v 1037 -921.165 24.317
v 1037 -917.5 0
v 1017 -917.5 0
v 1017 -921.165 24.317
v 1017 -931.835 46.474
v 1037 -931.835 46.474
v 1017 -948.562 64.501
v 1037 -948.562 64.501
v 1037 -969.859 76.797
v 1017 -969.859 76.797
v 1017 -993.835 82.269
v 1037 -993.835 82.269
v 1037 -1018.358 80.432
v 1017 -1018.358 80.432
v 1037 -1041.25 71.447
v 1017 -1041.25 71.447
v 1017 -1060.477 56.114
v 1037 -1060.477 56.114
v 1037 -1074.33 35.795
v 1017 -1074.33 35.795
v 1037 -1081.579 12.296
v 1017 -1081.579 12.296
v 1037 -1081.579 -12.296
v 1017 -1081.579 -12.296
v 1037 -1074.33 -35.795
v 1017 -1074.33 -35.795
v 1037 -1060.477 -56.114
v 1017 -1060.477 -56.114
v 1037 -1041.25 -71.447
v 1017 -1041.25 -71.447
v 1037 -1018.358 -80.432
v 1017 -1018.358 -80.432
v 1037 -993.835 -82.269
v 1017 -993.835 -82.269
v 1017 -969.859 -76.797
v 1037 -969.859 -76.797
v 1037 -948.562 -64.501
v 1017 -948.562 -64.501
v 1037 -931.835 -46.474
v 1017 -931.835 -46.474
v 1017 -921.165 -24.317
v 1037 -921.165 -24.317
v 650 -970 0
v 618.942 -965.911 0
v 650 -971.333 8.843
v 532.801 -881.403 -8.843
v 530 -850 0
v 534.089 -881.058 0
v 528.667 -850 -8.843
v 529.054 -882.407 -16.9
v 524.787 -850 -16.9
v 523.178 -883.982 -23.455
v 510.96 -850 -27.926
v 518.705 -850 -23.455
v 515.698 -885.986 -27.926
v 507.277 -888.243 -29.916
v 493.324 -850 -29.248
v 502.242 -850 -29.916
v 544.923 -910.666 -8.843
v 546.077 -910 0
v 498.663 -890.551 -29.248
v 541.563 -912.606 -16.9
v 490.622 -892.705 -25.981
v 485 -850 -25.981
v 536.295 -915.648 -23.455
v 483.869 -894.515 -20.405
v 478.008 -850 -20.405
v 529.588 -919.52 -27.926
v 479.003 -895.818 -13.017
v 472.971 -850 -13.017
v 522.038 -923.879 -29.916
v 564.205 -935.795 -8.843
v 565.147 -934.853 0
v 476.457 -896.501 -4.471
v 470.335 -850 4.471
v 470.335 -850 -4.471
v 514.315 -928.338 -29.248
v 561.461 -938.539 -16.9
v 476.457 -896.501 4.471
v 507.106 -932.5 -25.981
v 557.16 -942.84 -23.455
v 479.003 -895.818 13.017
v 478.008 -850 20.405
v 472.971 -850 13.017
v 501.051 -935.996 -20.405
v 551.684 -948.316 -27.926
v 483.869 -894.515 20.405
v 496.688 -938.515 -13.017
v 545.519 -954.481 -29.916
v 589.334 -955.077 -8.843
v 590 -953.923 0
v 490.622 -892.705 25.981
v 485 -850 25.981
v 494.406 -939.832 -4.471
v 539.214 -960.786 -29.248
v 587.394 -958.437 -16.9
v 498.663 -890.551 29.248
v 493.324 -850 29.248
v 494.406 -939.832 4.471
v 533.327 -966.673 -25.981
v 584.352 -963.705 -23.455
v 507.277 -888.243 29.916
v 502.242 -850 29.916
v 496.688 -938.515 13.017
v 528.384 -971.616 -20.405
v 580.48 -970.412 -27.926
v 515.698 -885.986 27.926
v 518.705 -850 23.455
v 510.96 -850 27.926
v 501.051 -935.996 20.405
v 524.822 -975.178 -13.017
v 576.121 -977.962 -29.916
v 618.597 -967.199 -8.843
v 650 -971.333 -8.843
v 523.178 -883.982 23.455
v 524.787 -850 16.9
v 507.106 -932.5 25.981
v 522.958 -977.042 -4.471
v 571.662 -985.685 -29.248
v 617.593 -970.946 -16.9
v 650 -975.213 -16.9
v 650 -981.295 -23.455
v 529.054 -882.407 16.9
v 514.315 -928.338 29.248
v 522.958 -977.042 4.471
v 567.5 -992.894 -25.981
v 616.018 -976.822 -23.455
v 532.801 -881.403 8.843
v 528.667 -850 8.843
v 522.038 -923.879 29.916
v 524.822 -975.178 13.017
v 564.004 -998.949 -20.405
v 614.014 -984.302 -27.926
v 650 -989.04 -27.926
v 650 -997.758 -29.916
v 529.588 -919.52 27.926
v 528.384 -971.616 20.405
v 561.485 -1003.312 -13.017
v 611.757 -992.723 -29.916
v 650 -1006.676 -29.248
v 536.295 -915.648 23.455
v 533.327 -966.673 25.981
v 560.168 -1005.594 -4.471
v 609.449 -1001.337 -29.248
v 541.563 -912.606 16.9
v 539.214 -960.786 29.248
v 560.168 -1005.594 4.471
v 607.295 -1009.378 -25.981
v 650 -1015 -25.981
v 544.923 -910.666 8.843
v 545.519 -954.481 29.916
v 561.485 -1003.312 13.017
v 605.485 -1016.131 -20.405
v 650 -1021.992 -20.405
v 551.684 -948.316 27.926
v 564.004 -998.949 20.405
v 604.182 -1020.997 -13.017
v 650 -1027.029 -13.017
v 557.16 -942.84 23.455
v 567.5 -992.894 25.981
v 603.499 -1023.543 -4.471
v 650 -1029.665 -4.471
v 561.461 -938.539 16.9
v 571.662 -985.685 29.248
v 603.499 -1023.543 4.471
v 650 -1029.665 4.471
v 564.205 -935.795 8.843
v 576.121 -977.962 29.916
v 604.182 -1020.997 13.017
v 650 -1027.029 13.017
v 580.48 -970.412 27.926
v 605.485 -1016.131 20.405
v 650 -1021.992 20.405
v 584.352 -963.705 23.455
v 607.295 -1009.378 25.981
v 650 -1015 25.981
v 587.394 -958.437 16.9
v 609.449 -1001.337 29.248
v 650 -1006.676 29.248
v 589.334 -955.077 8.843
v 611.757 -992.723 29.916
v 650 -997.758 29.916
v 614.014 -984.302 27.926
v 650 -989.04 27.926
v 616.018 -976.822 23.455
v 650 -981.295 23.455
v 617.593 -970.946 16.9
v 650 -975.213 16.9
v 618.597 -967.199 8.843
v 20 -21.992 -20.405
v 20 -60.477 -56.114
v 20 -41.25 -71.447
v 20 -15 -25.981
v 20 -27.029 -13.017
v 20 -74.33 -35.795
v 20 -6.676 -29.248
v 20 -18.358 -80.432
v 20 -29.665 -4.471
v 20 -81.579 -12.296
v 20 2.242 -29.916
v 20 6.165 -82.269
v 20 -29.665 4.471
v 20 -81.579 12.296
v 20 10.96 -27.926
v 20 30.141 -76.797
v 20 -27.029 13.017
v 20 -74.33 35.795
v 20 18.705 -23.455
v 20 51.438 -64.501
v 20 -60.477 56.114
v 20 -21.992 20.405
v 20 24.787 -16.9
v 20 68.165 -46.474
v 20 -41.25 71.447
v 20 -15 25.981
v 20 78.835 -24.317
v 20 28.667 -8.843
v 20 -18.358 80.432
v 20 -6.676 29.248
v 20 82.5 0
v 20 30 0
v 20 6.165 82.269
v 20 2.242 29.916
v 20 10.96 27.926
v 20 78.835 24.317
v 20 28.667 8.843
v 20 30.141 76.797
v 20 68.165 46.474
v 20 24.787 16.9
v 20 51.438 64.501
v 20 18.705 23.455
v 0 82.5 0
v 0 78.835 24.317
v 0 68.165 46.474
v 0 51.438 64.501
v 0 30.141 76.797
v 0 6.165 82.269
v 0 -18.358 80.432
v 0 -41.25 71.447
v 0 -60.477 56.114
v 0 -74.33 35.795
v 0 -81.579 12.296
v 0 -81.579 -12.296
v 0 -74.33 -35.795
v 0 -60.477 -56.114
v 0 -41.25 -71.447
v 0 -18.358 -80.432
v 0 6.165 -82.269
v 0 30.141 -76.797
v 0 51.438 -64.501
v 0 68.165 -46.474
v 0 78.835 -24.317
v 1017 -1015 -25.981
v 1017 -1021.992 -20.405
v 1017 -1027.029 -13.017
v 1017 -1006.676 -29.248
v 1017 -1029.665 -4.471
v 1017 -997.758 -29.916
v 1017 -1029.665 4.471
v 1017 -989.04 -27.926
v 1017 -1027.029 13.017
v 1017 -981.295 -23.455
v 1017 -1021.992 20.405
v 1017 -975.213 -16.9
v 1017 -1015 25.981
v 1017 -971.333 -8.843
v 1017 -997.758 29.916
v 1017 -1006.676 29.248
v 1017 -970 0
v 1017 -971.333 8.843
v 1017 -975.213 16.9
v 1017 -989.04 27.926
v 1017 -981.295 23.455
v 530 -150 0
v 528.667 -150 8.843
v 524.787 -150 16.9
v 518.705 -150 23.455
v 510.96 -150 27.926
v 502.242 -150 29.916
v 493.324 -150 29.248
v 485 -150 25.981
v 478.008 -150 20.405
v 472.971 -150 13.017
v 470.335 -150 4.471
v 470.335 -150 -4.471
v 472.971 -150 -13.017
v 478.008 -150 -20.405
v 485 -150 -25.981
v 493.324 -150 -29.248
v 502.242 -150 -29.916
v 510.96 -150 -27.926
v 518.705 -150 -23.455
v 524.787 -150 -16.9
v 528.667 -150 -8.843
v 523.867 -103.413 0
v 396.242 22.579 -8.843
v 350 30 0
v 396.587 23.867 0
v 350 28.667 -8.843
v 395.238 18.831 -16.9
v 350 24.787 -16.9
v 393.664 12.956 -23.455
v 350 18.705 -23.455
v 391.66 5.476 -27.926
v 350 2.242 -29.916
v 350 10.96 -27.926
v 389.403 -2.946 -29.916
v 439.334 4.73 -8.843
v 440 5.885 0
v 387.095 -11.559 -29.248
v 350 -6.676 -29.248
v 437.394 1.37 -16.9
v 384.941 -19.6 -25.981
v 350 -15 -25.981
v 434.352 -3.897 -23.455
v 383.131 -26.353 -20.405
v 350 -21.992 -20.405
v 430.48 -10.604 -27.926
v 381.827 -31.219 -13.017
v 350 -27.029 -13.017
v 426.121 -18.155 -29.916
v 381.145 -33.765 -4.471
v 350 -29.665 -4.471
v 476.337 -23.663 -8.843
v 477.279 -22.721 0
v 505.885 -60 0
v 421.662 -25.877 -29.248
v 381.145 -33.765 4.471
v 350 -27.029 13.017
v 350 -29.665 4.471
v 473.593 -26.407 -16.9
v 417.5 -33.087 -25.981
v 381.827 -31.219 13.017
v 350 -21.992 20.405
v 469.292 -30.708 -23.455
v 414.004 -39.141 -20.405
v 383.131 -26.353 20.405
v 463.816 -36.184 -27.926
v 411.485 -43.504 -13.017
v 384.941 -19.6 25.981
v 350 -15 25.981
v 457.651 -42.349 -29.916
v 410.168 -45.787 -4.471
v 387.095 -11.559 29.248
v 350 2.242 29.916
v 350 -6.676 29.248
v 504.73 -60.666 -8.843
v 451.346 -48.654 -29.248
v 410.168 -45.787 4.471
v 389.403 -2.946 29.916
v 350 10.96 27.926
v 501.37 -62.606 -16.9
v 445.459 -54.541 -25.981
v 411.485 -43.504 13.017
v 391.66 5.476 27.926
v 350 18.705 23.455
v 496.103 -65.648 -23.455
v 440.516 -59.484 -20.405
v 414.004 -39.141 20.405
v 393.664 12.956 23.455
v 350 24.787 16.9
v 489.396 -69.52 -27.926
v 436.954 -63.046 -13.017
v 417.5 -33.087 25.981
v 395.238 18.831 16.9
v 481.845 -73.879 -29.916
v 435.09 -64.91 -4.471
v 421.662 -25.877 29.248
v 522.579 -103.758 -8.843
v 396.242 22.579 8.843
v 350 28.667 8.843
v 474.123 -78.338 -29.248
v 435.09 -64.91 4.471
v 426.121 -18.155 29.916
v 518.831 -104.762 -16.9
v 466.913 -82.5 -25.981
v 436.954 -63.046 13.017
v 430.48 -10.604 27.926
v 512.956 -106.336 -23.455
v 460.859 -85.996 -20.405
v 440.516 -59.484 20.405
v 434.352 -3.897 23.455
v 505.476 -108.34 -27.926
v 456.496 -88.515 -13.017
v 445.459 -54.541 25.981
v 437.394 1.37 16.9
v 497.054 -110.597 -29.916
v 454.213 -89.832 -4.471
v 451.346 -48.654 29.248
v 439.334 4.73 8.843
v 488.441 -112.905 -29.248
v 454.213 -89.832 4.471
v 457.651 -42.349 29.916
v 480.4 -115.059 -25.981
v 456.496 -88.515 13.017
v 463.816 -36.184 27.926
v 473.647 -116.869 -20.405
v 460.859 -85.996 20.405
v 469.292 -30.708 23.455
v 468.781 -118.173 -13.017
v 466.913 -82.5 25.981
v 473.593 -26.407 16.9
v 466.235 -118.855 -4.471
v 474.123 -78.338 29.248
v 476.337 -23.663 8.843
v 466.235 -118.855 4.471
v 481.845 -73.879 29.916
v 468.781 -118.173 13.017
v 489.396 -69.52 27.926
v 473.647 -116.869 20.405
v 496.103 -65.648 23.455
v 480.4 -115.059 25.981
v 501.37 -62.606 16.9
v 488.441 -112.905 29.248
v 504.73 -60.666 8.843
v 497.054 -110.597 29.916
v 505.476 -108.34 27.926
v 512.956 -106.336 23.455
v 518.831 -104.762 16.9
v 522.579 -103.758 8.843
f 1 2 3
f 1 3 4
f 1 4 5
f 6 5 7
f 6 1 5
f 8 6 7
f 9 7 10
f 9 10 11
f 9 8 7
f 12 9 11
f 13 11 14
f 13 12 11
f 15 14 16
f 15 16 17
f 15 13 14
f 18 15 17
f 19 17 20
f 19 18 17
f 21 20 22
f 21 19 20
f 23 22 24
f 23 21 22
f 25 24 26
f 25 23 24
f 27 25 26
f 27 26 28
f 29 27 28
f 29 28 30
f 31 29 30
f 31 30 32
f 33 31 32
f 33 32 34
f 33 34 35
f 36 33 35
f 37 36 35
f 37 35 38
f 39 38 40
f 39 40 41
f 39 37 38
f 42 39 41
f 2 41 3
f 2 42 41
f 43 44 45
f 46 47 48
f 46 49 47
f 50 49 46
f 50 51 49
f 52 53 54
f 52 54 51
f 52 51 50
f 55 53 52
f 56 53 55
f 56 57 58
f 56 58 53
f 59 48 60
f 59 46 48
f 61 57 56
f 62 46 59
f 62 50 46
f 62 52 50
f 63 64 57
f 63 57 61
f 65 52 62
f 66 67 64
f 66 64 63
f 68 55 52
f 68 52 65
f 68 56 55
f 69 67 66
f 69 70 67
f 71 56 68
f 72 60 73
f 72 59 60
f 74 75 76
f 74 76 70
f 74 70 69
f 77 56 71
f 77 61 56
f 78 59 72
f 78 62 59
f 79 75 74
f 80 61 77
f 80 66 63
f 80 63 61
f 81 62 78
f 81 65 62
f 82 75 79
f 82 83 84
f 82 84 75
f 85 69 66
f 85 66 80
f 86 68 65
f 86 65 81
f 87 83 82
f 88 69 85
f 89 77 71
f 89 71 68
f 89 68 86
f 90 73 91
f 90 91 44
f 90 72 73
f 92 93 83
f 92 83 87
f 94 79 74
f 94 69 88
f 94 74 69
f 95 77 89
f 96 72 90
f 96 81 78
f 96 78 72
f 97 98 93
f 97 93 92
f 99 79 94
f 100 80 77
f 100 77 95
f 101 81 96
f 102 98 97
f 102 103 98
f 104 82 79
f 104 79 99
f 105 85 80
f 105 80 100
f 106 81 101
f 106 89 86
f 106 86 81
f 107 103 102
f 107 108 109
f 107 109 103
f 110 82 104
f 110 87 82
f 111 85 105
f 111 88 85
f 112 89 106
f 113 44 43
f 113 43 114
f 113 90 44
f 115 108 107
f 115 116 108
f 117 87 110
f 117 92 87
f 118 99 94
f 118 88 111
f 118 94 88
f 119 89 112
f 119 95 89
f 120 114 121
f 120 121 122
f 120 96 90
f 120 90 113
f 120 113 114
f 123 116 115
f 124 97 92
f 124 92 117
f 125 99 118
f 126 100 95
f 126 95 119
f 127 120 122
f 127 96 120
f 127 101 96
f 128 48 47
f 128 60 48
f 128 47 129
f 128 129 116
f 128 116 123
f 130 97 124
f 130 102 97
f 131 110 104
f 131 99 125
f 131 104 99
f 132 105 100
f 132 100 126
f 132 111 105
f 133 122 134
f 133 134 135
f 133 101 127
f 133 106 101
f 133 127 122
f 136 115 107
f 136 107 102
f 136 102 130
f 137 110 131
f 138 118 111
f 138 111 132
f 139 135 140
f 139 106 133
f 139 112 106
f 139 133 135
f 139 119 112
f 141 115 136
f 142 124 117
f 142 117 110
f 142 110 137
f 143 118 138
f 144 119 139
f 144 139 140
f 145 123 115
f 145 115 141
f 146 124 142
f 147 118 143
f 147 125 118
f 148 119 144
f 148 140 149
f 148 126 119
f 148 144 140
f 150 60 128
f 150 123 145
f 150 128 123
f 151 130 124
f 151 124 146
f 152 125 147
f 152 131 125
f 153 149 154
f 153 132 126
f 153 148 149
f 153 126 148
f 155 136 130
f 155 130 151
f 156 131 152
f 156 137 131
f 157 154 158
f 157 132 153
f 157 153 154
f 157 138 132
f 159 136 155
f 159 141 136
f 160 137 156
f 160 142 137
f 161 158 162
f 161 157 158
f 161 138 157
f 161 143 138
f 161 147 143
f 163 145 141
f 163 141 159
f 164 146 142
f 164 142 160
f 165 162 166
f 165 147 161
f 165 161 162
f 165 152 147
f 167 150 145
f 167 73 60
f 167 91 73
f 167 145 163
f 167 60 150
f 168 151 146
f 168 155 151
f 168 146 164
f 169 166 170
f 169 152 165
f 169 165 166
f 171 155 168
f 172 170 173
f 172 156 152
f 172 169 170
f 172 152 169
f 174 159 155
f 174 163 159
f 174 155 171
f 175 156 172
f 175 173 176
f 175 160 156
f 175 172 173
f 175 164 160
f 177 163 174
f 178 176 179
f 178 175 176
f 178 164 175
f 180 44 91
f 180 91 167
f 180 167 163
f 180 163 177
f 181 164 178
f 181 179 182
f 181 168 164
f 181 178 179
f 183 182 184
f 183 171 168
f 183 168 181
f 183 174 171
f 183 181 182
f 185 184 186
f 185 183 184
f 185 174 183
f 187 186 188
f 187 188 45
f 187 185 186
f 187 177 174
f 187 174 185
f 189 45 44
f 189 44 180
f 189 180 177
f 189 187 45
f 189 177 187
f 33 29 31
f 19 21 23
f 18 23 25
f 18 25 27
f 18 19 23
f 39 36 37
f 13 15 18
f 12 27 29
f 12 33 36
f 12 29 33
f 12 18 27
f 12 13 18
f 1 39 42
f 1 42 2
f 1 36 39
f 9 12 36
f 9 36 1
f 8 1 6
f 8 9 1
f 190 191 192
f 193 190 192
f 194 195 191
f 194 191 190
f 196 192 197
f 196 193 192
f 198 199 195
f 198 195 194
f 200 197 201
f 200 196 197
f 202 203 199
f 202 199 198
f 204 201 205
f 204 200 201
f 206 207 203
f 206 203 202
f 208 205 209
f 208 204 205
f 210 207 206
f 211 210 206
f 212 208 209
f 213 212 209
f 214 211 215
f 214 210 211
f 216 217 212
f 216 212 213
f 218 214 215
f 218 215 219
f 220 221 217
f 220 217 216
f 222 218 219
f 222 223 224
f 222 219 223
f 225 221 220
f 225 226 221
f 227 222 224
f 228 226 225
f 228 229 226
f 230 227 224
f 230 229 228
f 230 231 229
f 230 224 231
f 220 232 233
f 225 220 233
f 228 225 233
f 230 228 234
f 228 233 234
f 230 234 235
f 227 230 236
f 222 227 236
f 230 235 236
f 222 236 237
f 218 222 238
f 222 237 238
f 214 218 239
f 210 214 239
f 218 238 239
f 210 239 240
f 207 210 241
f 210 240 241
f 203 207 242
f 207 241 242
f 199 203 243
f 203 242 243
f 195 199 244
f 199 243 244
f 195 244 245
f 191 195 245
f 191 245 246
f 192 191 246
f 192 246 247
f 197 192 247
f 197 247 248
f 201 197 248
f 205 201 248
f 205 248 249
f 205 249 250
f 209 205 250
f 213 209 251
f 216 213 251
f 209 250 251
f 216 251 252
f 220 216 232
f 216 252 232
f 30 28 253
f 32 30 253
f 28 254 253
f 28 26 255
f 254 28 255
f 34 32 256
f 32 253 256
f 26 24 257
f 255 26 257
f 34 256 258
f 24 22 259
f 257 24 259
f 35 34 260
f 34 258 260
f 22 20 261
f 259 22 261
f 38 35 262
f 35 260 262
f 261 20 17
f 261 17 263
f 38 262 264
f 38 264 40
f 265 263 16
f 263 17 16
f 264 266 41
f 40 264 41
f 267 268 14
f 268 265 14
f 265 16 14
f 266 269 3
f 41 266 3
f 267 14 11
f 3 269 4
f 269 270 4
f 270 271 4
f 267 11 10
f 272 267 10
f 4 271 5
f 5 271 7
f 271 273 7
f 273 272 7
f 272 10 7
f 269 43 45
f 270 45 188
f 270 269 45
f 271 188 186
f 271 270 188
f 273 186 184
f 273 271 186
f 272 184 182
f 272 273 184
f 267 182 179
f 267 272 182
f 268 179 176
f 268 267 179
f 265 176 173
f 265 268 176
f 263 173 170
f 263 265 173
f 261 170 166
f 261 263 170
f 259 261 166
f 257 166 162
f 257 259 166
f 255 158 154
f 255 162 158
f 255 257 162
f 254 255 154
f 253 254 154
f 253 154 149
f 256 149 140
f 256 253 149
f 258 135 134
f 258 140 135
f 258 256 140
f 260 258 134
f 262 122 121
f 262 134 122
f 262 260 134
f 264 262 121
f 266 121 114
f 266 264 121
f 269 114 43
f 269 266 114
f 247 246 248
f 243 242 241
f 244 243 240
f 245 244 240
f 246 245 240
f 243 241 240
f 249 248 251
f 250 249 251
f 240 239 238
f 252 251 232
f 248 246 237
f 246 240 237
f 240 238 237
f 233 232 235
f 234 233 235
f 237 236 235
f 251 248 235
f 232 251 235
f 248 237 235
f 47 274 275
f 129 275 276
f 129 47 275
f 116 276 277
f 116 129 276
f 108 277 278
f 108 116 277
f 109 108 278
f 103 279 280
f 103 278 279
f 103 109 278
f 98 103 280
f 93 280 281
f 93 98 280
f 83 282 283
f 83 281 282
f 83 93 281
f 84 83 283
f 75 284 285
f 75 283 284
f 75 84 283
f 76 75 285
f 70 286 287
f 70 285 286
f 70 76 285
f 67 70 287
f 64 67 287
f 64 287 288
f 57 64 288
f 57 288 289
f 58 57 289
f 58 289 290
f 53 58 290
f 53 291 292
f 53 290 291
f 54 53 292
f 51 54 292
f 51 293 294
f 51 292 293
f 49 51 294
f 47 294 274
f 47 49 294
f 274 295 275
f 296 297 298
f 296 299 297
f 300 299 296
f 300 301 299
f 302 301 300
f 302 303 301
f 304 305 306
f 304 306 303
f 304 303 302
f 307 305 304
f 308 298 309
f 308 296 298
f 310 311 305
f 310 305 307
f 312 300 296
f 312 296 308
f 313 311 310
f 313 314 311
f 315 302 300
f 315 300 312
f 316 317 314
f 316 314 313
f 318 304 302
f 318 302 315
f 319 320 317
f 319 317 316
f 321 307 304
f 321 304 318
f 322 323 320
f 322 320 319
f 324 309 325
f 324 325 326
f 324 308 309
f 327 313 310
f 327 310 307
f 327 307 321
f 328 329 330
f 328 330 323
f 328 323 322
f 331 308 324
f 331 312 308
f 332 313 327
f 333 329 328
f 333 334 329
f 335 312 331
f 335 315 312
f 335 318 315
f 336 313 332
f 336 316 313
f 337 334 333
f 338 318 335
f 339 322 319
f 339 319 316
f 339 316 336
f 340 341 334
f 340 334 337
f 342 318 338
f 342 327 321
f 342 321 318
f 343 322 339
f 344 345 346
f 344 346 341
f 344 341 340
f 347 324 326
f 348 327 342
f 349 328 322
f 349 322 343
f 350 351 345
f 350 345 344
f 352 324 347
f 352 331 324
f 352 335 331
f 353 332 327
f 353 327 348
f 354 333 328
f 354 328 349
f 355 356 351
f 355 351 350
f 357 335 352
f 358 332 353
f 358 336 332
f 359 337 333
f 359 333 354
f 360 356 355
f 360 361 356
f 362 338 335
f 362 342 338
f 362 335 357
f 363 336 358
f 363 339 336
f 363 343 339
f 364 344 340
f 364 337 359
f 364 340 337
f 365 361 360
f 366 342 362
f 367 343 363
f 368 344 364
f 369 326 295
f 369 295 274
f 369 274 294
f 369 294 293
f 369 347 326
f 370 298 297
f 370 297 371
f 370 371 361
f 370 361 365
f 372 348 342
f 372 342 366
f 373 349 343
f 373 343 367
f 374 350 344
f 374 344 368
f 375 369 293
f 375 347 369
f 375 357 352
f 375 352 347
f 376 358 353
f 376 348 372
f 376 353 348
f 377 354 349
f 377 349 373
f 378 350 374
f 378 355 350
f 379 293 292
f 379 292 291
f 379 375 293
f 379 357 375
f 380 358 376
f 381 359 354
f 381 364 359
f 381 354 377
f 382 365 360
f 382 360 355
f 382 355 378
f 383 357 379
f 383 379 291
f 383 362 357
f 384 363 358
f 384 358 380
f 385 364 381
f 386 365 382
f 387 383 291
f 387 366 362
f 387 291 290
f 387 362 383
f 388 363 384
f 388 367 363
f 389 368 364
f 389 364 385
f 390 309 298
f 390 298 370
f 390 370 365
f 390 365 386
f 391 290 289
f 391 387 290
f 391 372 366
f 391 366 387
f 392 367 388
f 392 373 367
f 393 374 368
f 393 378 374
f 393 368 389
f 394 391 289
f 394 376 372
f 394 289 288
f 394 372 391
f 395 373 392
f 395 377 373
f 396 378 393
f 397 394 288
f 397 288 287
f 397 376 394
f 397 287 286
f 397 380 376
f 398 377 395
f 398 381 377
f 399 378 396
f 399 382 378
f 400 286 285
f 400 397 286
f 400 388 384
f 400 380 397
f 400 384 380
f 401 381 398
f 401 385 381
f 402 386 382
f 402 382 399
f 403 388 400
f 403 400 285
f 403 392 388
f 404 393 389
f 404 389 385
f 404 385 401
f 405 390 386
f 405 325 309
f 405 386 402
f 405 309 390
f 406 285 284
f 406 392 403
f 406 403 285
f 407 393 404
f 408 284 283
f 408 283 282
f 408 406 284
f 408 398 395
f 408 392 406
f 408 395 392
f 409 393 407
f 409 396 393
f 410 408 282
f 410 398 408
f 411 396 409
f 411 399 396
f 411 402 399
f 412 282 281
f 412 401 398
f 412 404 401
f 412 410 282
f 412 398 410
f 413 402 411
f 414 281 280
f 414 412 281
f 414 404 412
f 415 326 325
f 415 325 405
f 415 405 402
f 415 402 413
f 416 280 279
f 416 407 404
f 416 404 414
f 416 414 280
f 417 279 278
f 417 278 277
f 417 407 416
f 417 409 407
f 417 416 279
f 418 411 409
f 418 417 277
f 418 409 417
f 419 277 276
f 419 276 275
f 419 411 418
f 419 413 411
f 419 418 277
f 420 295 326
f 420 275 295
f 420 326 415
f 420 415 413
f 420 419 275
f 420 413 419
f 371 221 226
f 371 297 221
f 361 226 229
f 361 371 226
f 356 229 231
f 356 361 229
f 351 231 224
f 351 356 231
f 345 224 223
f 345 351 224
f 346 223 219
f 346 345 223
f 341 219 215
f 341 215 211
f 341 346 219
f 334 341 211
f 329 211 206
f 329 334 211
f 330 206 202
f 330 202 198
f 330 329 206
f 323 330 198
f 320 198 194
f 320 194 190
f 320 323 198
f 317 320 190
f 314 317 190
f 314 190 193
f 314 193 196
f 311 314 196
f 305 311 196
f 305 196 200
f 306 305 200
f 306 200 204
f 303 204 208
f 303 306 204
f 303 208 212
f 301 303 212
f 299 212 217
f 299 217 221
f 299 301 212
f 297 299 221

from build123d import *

# Parameters (mm, degrees)
F1_R     = 30
F1_R_2   = 82.5
F3_DEPTH = 20
F4_R     = 82.5
F4_R_2   = 30
F5_DEPTH = 20


with BuildPart() as f2:
    # F2: sweep along a path in F0
    with BuildLine(Plane.XY) as f2_path:
        Line((0, 0), (350, 0))
        ThreePointArc((350, 0), (456.066017178, -43.933982822), (500, -150))
        Line((500, -150), (500, -850))
        ThreePointArc((500, -850), (543.933982822, -956.066017178), (650, -1000))
        Line((650, -1000), (1037, -1000))
    # F1 (on Right) → F2 (sweep)
    with BuildSketch(Plane.YZ):
        Circle(F1_R)
    sweep(path=f2_path.line)

    # F1 (on Right) → F3 (join)
    with BuildSketch(Plane.YZ):
        Circle(F1_R_2)
        Circle(F1_R, mode=Mode.SUBTRACT)
    extrude(amount=F3_DEPTH)

    # F4 (on face) → F5 (join)
    with BuildSketch(Plane.YZ.offset(1037)):
        with Locations((-1000, 0)):
            Circle(F4_R)
        with Locations((-1000, 0)):
            Circle(F4_R_2, mode=Mode.SUBTRACT)
    extrude(amount=-F5_DEPTH)


solid = f2.part
